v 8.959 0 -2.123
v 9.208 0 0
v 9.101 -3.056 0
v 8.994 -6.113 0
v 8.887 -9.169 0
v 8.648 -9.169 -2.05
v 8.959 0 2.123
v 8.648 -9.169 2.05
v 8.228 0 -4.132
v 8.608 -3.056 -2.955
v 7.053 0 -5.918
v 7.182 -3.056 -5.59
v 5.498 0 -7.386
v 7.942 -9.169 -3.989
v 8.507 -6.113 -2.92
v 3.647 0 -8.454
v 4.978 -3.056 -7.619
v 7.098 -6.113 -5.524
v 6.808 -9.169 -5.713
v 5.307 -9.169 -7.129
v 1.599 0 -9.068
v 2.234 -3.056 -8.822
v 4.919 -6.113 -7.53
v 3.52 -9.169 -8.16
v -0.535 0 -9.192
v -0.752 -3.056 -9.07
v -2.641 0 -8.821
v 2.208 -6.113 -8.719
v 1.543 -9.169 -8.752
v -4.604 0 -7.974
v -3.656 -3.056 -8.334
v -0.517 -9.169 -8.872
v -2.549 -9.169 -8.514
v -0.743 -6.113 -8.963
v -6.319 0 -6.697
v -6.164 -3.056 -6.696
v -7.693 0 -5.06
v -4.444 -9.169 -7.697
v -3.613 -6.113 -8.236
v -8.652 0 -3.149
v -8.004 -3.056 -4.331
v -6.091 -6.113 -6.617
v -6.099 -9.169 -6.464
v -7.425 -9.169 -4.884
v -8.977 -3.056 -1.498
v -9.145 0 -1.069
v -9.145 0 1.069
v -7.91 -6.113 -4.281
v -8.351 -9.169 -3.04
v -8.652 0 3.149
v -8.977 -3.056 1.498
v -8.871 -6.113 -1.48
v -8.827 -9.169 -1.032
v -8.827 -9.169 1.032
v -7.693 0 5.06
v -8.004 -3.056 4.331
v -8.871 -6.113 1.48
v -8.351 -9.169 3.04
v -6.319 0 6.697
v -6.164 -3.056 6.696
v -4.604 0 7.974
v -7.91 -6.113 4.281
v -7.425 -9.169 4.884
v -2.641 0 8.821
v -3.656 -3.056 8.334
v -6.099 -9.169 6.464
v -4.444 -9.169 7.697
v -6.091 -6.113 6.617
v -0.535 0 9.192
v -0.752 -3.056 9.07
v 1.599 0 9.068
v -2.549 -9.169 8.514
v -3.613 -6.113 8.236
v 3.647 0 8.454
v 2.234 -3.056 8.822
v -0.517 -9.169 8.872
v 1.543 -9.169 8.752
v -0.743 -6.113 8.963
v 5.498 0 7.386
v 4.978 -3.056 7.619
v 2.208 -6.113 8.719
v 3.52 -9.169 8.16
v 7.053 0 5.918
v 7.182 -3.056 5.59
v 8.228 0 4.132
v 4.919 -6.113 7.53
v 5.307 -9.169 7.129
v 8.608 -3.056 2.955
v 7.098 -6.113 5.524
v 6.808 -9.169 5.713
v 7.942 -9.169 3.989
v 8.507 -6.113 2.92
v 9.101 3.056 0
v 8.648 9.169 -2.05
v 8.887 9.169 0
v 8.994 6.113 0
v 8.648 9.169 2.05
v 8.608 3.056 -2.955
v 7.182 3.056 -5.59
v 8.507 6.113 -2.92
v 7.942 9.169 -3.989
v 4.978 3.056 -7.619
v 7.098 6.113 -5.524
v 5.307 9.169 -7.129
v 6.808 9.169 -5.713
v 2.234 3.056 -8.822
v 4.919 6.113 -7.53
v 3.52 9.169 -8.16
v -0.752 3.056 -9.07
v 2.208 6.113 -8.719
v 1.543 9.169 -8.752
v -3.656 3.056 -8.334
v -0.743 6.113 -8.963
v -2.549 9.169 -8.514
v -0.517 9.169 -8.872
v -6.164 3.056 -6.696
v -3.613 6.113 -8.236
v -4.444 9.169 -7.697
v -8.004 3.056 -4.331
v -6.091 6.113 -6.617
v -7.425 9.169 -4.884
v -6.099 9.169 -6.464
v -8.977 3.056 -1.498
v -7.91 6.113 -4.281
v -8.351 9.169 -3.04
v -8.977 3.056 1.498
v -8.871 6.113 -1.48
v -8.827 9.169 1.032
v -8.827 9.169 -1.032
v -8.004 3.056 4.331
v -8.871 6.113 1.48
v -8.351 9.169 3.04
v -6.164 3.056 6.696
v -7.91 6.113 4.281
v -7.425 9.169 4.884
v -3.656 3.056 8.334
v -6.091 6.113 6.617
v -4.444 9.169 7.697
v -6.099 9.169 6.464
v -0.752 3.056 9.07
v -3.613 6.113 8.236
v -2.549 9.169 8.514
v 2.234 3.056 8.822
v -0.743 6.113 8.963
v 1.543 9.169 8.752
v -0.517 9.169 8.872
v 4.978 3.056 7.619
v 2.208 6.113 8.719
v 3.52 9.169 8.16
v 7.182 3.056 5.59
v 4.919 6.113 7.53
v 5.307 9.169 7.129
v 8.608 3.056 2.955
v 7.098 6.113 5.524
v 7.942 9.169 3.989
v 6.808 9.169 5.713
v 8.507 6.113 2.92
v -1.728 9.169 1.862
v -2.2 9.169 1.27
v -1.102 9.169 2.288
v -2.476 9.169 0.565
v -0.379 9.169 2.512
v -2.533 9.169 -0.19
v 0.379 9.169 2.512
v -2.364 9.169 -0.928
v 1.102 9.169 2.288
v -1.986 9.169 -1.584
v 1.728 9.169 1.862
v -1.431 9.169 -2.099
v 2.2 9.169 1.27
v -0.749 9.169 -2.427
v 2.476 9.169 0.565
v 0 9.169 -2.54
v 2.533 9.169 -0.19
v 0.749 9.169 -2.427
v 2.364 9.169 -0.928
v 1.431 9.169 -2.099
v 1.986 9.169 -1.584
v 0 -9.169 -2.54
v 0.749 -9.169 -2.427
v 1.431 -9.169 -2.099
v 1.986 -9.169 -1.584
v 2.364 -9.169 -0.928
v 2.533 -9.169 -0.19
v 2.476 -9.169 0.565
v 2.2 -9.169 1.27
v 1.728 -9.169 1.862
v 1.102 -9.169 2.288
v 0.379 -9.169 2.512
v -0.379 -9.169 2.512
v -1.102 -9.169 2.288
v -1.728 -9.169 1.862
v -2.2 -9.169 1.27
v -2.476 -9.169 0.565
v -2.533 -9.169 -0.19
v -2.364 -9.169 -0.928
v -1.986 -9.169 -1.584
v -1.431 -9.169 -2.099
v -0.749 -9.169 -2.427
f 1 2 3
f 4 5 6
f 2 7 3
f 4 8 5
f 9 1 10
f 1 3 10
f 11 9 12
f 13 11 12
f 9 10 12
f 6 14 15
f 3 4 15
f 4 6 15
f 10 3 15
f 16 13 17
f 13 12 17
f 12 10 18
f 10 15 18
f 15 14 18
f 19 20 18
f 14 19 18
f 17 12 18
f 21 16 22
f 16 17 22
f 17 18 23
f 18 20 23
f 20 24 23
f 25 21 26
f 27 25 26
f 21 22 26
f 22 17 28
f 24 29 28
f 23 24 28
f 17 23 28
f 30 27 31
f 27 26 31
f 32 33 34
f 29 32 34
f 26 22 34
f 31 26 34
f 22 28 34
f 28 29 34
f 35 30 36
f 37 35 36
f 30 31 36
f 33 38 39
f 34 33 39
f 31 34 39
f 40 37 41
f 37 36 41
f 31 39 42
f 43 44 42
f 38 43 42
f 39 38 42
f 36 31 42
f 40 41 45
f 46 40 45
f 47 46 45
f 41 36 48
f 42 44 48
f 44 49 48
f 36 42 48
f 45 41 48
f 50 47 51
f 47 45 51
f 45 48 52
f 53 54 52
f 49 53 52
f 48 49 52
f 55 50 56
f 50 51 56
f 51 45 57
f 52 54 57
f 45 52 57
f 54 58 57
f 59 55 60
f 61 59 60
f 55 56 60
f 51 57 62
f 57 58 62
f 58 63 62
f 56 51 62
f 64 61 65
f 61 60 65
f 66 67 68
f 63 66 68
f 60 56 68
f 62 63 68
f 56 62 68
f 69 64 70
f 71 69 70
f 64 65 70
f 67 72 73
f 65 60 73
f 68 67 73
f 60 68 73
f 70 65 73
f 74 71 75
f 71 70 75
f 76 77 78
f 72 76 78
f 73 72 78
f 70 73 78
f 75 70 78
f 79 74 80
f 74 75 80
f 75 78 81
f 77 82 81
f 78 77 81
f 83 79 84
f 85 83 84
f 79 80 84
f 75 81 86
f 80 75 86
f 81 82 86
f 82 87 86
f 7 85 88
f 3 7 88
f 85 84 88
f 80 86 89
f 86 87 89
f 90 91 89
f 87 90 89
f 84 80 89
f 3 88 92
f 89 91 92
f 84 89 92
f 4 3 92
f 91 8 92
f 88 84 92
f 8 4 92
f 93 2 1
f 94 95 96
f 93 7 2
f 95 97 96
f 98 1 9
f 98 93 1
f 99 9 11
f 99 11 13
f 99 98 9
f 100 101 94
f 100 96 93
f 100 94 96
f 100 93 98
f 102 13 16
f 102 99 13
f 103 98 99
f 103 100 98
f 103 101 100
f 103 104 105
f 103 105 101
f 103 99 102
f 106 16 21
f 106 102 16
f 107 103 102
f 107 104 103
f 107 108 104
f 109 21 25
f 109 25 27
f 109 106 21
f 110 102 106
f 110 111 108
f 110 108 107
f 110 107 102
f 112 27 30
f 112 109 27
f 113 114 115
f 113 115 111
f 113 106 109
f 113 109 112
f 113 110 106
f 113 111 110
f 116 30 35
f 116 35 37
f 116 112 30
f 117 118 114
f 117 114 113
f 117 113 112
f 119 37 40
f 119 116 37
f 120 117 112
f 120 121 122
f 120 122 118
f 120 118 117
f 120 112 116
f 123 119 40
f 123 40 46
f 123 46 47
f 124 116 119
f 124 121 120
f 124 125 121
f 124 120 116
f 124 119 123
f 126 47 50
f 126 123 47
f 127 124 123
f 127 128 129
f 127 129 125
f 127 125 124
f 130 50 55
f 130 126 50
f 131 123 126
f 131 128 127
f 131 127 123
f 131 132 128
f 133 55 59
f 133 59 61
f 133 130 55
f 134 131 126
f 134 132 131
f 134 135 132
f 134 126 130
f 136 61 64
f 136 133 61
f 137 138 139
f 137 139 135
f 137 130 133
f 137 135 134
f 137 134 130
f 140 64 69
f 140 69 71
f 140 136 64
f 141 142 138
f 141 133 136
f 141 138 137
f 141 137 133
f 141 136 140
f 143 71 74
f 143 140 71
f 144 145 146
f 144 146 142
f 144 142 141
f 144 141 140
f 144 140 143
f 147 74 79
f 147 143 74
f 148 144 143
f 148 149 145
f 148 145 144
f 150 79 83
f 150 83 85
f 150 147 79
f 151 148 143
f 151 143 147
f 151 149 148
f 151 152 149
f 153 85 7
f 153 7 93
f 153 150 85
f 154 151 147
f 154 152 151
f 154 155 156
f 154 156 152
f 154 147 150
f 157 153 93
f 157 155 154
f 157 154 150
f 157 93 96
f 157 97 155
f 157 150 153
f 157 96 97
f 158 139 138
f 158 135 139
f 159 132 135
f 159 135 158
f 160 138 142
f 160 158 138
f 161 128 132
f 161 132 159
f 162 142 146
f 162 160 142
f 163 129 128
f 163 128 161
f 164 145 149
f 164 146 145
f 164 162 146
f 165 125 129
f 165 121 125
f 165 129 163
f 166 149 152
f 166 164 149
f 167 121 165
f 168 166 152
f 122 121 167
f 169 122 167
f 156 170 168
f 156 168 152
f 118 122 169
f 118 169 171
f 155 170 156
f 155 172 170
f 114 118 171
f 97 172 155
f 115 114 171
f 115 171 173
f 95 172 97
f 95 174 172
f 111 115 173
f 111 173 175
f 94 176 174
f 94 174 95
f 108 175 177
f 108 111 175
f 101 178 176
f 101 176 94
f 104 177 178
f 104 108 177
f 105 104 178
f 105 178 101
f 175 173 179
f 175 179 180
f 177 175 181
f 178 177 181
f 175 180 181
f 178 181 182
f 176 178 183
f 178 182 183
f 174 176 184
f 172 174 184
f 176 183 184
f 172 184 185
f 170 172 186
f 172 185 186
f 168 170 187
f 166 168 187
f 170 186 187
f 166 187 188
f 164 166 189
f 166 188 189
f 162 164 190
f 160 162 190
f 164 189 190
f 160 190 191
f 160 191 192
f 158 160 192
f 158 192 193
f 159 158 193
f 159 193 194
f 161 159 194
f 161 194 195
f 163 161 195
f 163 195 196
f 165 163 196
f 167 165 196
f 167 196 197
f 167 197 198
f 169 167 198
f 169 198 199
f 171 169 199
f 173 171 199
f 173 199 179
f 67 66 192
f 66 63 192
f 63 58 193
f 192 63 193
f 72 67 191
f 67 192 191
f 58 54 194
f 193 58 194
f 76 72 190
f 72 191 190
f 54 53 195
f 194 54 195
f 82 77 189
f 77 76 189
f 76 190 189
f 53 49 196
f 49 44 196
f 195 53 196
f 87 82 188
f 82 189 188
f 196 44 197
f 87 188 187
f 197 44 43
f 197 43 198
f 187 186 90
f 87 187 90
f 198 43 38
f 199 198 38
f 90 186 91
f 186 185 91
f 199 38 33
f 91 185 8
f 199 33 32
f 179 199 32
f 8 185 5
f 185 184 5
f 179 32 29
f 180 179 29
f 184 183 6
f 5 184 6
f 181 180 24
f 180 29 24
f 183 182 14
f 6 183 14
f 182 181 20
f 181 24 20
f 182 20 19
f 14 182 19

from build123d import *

# Parameters (mm, degrees)
SKETCH1_R           = 9.2075
BOSS_EXTRUDE1_DEPTH = 9.1694
BOSS_EXTRUDE1_TAPER = 2
SKETCH2_R           = 2.54
CUT_EXTRUDE1_DEPTH  = 23.491502958


with BuildPart() as part:
    # Sketch1 → Boss-Extrude1 (new body)
    with BuildSketch(Plane(origin=(0, 0, 0), x_dir=(1, 0, 0), z_dir=(0, 1, 0))):
        Circle(SKETCH1_R)
    boss_extrude1 = extrude(amount=BOSS_EXTRUDE1_DEPTH, taper=BOSS_EXTRUDE1_TAPER)

    # Mirror1: Boss-Extrude1 across plane
    add(boss_extrude1.mirror(Plane.ZX))

    # Sketch2 → Cut-Extrude1 (cut, through all)
    with BuildSketch(Plane(origin=(0, -9.1694, 0), x_dir=(-1, 0, 0), z_dir=(0, -1, 0))):
        with Locations(Location((0, 0, 0), (0, 0, 90))):
            Circle(SKETCH2_R)
    extrude(amount=-CUT_EXTRUDE1_DEPTH, mode=Mode.SUBTRACT)


solid = part.part
